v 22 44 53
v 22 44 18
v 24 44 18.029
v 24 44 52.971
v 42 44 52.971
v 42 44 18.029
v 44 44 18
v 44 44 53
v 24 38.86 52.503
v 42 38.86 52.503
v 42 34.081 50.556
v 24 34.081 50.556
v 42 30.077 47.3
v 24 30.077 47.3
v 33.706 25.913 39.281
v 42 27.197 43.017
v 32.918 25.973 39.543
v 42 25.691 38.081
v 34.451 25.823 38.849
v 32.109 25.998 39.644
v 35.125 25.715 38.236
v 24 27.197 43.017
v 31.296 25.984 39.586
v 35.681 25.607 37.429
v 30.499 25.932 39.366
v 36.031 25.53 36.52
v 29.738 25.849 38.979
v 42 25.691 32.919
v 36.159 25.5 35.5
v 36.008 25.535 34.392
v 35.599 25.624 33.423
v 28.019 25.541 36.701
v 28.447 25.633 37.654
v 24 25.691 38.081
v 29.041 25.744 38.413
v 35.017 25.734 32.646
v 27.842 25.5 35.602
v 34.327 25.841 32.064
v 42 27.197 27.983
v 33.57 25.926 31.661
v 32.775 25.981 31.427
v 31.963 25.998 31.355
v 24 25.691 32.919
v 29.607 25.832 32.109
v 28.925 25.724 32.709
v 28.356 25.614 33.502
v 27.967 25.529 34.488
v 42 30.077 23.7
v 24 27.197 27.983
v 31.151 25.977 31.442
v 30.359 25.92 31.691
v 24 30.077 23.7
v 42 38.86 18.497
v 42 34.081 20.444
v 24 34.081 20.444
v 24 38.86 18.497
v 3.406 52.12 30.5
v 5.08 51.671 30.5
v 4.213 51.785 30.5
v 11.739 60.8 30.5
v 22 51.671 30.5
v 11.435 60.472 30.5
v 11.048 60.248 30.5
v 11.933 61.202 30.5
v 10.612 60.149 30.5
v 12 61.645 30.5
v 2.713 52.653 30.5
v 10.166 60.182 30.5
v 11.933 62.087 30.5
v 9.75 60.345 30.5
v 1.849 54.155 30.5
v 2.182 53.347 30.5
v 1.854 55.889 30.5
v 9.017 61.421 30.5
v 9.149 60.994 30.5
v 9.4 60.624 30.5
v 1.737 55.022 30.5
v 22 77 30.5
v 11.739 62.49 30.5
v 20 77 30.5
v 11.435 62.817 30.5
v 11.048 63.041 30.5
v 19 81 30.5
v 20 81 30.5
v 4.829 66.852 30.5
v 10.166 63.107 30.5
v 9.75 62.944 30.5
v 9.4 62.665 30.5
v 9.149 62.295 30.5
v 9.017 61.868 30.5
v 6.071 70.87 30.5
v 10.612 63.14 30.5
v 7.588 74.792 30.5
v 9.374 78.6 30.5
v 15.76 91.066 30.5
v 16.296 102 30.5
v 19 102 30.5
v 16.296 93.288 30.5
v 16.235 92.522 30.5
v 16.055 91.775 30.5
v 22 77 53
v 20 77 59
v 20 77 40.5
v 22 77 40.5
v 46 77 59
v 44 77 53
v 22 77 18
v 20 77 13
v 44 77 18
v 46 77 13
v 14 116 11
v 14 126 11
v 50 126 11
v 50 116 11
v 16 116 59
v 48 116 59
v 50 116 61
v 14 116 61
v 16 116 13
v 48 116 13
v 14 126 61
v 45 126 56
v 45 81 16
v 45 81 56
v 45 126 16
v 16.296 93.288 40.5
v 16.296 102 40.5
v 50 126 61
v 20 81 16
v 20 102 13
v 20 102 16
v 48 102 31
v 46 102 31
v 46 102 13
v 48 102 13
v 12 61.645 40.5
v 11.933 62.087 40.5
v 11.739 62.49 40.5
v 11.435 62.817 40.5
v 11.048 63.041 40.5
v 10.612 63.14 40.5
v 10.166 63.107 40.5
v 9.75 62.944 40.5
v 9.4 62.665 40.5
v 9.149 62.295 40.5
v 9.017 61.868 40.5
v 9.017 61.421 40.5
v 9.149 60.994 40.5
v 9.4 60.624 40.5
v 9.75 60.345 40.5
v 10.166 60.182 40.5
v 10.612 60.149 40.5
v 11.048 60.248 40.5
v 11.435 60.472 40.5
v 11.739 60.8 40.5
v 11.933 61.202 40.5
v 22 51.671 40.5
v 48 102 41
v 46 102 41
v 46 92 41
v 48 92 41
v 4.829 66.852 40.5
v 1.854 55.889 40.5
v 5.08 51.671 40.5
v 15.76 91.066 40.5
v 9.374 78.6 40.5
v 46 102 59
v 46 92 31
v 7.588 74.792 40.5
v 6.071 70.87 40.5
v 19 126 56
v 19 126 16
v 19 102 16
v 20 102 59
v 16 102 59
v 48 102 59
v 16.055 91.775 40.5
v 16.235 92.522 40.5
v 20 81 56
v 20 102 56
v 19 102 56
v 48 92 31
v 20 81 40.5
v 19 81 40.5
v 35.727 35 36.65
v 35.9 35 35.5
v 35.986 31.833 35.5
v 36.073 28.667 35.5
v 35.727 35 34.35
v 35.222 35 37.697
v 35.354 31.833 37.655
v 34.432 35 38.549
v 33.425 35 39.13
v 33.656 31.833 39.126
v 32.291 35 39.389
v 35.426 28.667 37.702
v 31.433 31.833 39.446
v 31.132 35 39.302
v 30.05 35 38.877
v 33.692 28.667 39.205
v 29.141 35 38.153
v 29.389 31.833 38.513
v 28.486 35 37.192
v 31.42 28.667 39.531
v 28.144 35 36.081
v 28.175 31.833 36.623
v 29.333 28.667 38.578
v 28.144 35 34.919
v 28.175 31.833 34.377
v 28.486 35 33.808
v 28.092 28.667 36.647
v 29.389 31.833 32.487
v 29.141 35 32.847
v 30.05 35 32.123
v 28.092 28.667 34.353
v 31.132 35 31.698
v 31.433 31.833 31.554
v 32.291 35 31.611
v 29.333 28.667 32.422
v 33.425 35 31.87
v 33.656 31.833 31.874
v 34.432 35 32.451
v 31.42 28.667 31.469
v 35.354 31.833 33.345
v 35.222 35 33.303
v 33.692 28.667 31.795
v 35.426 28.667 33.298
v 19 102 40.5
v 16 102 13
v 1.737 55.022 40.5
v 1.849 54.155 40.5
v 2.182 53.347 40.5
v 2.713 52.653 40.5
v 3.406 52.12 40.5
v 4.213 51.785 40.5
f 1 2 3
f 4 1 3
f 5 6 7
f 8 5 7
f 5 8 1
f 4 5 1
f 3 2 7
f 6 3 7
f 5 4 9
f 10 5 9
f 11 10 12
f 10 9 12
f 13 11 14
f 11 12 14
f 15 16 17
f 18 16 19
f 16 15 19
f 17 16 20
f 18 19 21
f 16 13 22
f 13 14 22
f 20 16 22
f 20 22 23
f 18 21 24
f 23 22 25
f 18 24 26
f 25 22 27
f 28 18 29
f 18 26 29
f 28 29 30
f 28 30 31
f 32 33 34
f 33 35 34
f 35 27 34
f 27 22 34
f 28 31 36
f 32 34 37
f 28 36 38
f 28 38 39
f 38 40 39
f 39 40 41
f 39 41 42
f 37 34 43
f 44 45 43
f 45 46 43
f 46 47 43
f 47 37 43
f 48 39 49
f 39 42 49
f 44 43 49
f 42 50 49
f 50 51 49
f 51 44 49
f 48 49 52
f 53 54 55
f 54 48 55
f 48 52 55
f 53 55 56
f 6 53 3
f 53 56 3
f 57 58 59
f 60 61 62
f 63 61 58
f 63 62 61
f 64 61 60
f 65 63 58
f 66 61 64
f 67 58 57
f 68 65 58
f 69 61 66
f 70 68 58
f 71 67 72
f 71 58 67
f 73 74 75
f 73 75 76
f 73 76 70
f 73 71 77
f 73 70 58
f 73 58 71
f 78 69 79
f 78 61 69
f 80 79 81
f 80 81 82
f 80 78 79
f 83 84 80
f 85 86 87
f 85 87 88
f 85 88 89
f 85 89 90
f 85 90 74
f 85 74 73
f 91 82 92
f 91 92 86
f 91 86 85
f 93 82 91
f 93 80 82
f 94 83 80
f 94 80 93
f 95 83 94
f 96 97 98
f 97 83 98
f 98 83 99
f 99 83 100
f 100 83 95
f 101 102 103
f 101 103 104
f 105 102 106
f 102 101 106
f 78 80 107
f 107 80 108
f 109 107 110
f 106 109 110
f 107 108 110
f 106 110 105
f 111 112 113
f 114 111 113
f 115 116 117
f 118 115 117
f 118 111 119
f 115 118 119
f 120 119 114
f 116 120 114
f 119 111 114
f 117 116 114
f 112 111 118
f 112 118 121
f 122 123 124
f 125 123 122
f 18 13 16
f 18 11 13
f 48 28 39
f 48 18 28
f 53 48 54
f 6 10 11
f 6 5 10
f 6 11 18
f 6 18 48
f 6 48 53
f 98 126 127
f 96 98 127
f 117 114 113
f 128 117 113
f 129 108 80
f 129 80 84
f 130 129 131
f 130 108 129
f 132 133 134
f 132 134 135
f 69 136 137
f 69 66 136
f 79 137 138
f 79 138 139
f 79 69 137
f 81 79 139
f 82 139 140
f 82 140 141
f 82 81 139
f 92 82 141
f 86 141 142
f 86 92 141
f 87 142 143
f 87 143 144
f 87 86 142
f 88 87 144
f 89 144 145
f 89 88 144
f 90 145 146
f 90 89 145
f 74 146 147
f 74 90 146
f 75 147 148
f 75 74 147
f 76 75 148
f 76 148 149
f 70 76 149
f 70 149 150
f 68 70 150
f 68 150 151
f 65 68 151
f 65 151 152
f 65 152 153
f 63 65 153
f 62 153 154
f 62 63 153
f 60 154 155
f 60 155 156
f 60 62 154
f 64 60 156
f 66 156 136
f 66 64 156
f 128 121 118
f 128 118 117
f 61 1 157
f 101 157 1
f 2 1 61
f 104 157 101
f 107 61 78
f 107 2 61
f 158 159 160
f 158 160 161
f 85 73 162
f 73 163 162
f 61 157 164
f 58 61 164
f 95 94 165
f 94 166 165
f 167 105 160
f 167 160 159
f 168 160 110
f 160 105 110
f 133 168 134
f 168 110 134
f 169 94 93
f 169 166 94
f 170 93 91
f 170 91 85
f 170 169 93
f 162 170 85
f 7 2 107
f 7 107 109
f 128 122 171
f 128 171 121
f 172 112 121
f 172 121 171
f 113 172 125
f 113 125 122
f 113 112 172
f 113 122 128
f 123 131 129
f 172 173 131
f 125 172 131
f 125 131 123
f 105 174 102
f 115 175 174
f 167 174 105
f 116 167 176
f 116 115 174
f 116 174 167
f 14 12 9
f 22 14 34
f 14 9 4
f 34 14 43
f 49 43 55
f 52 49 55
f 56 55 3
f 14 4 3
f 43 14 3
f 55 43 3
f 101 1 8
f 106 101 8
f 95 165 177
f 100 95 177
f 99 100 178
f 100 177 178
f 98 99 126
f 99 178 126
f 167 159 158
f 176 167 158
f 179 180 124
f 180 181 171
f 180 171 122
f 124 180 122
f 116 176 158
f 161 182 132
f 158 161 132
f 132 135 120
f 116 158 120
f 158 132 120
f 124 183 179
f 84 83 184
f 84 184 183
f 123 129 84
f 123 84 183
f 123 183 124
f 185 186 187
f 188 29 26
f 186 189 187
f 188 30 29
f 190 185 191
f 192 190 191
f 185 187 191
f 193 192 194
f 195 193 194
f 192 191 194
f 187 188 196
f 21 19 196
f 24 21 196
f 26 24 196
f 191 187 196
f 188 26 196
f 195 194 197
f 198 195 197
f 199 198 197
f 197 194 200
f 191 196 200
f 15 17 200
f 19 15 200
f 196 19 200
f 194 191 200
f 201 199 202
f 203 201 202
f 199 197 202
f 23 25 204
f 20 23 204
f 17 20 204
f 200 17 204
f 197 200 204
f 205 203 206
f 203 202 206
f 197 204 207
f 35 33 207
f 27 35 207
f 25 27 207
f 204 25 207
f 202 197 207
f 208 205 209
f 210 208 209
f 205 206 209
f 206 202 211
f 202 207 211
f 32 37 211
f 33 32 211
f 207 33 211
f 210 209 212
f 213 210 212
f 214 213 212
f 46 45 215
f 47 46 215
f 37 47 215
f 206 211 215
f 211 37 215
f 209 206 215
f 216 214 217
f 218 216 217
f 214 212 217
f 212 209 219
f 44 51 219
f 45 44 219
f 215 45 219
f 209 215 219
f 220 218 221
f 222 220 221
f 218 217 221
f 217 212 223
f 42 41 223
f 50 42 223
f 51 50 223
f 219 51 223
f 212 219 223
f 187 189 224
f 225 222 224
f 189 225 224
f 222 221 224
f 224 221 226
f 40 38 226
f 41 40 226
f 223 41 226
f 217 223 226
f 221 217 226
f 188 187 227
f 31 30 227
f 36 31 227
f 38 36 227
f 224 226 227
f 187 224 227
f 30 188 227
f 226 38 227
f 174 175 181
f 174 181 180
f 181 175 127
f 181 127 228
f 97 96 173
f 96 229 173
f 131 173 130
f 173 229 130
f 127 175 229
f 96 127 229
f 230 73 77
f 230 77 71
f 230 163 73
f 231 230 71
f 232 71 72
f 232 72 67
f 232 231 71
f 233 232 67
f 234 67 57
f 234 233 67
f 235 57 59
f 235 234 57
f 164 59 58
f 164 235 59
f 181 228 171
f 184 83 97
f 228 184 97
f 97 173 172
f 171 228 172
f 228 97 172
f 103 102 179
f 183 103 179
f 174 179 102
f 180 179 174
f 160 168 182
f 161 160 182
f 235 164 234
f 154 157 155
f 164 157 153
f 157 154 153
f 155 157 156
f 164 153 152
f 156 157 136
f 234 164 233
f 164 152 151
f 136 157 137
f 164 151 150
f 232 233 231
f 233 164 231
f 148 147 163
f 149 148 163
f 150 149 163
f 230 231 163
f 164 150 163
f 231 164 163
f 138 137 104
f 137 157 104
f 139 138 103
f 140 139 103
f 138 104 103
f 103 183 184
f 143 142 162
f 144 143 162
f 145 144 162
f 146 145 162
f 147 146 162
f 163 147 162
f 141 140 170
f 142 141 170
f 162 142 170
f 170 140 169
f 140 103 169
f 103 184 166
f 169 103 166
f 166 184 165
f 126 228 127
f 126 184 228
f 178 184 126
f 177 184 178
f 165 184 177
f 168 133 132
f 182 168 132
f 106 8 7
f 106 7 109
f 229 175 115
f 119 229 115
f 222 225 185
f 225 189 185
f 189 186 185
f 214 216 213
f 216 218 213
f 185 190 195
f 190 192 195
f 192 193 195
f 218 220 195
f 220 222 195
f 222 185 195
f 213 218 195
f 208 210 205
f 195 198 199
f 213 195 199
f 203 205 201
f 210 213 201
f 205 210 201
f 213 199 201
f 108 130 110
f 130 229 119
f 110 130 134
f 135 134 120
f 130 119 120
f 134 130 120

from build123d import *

# Parameters (mm, degrees)
CONE002_ROLL_ANGLE   = 90
BOX005_W             = 26
BOX005_H             = 50
BOX005_DEPTH         = 40
BOX001_W             = 32
BOX001_H             = 17
BOX001_DEPTH         = 46
BOX002_W             = 26
BOX002_H             = 12
BOX002_DEPTH         = 10
BOX003_W             = 26
BOX003_H             = 26
BOX003_DEPTH         = 46
BOX004_W             = 22
BOX004_H             = 36
BOX004_DEPTH         = 35
CYLINDER_R           = 17.5
CYLINDER_DEPTH       = 18
CYLINDER_PITCH_ANGLE = 90
SKETCH001_R          = 1.5
PAD_DEPTH            = 4.5
PAD_DEPTH_BACK       = 5.5
BOX_W                = 36
BOX_H                = 10
BOX_DEPTH            = 50


with BuildPart() as beinloch001:
    # Cone002 → Cone002 (revolve)
    with BuildSketch(Plane.XZ):
        Polygon((0, 0), (3.9, 0), (4.2, 11), (0, 11), align=None)
    revolve(axis=Axis((0, 0, 0), (0, 0, 1)))


with BuildPart() as beinloch001_1:
    # Cone002 roll: moved
    add(beinloch001.part.rotate(Axis((0, 0, 0), (1, 0, 0)), CONE002_ROLL_ANGLE))


with BuildPart() as beinloch001_2:
    # Cone002 placement: moved
    add(beinloch001_1.part.moved(Location((32, 35, 35.5))))


with BuildPart() as kopfloch:
    # Box005 → Box005 (new body)
    with BuildSketch(Plane(origin=(19, 81, 16), x_dir=(1, 0, 0), z_dir=(0, 0, 1))):
        with Locations((13, 25)):
            Rectangle(BOX005_W, BOX005_H)
    extrude(amount=BOX005_DEPTH)


with BuildPart() as stirn:
    # Box001 → Box001 (new body)
    with BuildSketch(Plane(origin=(16, 102, 13), x_dir=(1, 0, 0), z_dir=(0, 0, 1))):
        with Locations((16, 8.5)):
            Rectangle(BOX001_W, BOX001_H)
    extrude(amount=BOX001_DEPTH)


with BuildPart() as gnack:
    # Box002 → Box002 (new body)
    with BuildSketch(Plane(origin=(22, 92, 31), x_dir=(1, 0, 0), z_dir=(0, 0, 1))):
        with Locations((13, 6)):
            Rectangle(BOX002_W, BOX002_H)
    extrude(amount=BOX002_DEPTH)


with BuildPart() as augen:
    # Box003 → Box003 (new body)
    with BuildSketch(Plane(origin=(20, 77, 13), x_dir=(1, 0, 0), z_dir=(0, 0, 1))):
        with Locations((13, 13)):
            Rectangle(BOX003_W, BOX003_H)
    extrude(amount=BOX003_DEPTH)


with BuildPart() as wangen:
    # Box004 → Box004 (new body)
    with BuildSketch(Plane(origin=(22, 44, 18), x_dir=(1, 0, 0), z_dir=(0, 0, 1))):
        with Locations((11, 18)):
            Rectangle(BOX004_W, BOX004_H)
    extrude(amount=BOX004_DEPTH)


with BuildPart() as kinn:
    # Cylinder → Cylinder (new body)
    with BuildSketch(Plane.XY):
        Circle(CYLINDER_R)
    extrude(amount=CYLINDER_DEPTH)


with BuildPart() as kinn_1:
    # Cylinder pitch: moved
    add(kinn.part.rotate(Axis((0, 0, 0), (0, 1, 0)), CYLINDER_PITCH_ANGLE))


with BuildPart() as kinn_2:
    # Cylinder placement: moved
    add(kinn_1.part.moved(Location((24, 43, 35.5))))


with BuildPart() as nase:
    # Sketch001 → Pad (new body, two sides)
    with BuildSketch(Plane(origin=(22, 44, 36), x_dir=(1, 0, 0), z_dir=(0, 0, 1))) as pad_sk:
        with BuildLine():
            Line((1.5, 7.670836), (-16.920451, 7.670836))
            ThreePointArc((-20.14616, 11.888508), (-19.57535, 8.982708), (-16.920451, 7.670836))
            Line((-20.14616, 11.888508), (-17.171201, 22.851854))
            ThreePointArc((-12.625578, 34.600006), (-15.204729, 28.844459), (-17.171201, 22.851854))
            Line((-12.625578, 34.600006), (-6.240143, 47.065773))
            ThreePointArc((-6.240143, 47.065773), (-5.840064, 48.144871), (-5.704179, 49.287696))
            Line((-5.704179, 49.287696), (-5.704179, 58.874008))
            Line((-5.704179, 58.874008), (1.5, 58.874008))
            Line((1.5, 58.874008), (1.5, 7.670836))
        make_face()
        with Locations((-11.5, 17.644535)):
            Circle(SKETCH001_R, mode=Mode.SUBTRACT)
    extrude(amount=PAD_DEPTH)
    extrude(pad_sk.sketch, amount=-PAD_DEPTH_BACK)


with BuildPart() as kopf:
    # Box → Box (new body)
    with BuildSketch(Plane(origin=(14, 116, 11), x_dir=(1, 0, 0), z_dir=(0, 0, 1))):
        with Locations((18, 5)):
            Rectangle(BOX_W, BOX_H)
    extrude(amount=BOX_DEPTH)

    # Fusion: union stirn, gnack, augen, wangen, kinn, nase
    add(stirn.part)
    add(gnack.part)
    add(augen.part)
    add(wangen.part)
    add(kinn_2.part)
    add(nase.part)

    # Cut: cut kopfloch
    add(kopfloch.part, mode=Mode.SUBTRACT)

    # Cut001: cut beinloch001
    add(beinloch001_2.part, mode=Mode.SUBTRACT)


solid = kopf.part
